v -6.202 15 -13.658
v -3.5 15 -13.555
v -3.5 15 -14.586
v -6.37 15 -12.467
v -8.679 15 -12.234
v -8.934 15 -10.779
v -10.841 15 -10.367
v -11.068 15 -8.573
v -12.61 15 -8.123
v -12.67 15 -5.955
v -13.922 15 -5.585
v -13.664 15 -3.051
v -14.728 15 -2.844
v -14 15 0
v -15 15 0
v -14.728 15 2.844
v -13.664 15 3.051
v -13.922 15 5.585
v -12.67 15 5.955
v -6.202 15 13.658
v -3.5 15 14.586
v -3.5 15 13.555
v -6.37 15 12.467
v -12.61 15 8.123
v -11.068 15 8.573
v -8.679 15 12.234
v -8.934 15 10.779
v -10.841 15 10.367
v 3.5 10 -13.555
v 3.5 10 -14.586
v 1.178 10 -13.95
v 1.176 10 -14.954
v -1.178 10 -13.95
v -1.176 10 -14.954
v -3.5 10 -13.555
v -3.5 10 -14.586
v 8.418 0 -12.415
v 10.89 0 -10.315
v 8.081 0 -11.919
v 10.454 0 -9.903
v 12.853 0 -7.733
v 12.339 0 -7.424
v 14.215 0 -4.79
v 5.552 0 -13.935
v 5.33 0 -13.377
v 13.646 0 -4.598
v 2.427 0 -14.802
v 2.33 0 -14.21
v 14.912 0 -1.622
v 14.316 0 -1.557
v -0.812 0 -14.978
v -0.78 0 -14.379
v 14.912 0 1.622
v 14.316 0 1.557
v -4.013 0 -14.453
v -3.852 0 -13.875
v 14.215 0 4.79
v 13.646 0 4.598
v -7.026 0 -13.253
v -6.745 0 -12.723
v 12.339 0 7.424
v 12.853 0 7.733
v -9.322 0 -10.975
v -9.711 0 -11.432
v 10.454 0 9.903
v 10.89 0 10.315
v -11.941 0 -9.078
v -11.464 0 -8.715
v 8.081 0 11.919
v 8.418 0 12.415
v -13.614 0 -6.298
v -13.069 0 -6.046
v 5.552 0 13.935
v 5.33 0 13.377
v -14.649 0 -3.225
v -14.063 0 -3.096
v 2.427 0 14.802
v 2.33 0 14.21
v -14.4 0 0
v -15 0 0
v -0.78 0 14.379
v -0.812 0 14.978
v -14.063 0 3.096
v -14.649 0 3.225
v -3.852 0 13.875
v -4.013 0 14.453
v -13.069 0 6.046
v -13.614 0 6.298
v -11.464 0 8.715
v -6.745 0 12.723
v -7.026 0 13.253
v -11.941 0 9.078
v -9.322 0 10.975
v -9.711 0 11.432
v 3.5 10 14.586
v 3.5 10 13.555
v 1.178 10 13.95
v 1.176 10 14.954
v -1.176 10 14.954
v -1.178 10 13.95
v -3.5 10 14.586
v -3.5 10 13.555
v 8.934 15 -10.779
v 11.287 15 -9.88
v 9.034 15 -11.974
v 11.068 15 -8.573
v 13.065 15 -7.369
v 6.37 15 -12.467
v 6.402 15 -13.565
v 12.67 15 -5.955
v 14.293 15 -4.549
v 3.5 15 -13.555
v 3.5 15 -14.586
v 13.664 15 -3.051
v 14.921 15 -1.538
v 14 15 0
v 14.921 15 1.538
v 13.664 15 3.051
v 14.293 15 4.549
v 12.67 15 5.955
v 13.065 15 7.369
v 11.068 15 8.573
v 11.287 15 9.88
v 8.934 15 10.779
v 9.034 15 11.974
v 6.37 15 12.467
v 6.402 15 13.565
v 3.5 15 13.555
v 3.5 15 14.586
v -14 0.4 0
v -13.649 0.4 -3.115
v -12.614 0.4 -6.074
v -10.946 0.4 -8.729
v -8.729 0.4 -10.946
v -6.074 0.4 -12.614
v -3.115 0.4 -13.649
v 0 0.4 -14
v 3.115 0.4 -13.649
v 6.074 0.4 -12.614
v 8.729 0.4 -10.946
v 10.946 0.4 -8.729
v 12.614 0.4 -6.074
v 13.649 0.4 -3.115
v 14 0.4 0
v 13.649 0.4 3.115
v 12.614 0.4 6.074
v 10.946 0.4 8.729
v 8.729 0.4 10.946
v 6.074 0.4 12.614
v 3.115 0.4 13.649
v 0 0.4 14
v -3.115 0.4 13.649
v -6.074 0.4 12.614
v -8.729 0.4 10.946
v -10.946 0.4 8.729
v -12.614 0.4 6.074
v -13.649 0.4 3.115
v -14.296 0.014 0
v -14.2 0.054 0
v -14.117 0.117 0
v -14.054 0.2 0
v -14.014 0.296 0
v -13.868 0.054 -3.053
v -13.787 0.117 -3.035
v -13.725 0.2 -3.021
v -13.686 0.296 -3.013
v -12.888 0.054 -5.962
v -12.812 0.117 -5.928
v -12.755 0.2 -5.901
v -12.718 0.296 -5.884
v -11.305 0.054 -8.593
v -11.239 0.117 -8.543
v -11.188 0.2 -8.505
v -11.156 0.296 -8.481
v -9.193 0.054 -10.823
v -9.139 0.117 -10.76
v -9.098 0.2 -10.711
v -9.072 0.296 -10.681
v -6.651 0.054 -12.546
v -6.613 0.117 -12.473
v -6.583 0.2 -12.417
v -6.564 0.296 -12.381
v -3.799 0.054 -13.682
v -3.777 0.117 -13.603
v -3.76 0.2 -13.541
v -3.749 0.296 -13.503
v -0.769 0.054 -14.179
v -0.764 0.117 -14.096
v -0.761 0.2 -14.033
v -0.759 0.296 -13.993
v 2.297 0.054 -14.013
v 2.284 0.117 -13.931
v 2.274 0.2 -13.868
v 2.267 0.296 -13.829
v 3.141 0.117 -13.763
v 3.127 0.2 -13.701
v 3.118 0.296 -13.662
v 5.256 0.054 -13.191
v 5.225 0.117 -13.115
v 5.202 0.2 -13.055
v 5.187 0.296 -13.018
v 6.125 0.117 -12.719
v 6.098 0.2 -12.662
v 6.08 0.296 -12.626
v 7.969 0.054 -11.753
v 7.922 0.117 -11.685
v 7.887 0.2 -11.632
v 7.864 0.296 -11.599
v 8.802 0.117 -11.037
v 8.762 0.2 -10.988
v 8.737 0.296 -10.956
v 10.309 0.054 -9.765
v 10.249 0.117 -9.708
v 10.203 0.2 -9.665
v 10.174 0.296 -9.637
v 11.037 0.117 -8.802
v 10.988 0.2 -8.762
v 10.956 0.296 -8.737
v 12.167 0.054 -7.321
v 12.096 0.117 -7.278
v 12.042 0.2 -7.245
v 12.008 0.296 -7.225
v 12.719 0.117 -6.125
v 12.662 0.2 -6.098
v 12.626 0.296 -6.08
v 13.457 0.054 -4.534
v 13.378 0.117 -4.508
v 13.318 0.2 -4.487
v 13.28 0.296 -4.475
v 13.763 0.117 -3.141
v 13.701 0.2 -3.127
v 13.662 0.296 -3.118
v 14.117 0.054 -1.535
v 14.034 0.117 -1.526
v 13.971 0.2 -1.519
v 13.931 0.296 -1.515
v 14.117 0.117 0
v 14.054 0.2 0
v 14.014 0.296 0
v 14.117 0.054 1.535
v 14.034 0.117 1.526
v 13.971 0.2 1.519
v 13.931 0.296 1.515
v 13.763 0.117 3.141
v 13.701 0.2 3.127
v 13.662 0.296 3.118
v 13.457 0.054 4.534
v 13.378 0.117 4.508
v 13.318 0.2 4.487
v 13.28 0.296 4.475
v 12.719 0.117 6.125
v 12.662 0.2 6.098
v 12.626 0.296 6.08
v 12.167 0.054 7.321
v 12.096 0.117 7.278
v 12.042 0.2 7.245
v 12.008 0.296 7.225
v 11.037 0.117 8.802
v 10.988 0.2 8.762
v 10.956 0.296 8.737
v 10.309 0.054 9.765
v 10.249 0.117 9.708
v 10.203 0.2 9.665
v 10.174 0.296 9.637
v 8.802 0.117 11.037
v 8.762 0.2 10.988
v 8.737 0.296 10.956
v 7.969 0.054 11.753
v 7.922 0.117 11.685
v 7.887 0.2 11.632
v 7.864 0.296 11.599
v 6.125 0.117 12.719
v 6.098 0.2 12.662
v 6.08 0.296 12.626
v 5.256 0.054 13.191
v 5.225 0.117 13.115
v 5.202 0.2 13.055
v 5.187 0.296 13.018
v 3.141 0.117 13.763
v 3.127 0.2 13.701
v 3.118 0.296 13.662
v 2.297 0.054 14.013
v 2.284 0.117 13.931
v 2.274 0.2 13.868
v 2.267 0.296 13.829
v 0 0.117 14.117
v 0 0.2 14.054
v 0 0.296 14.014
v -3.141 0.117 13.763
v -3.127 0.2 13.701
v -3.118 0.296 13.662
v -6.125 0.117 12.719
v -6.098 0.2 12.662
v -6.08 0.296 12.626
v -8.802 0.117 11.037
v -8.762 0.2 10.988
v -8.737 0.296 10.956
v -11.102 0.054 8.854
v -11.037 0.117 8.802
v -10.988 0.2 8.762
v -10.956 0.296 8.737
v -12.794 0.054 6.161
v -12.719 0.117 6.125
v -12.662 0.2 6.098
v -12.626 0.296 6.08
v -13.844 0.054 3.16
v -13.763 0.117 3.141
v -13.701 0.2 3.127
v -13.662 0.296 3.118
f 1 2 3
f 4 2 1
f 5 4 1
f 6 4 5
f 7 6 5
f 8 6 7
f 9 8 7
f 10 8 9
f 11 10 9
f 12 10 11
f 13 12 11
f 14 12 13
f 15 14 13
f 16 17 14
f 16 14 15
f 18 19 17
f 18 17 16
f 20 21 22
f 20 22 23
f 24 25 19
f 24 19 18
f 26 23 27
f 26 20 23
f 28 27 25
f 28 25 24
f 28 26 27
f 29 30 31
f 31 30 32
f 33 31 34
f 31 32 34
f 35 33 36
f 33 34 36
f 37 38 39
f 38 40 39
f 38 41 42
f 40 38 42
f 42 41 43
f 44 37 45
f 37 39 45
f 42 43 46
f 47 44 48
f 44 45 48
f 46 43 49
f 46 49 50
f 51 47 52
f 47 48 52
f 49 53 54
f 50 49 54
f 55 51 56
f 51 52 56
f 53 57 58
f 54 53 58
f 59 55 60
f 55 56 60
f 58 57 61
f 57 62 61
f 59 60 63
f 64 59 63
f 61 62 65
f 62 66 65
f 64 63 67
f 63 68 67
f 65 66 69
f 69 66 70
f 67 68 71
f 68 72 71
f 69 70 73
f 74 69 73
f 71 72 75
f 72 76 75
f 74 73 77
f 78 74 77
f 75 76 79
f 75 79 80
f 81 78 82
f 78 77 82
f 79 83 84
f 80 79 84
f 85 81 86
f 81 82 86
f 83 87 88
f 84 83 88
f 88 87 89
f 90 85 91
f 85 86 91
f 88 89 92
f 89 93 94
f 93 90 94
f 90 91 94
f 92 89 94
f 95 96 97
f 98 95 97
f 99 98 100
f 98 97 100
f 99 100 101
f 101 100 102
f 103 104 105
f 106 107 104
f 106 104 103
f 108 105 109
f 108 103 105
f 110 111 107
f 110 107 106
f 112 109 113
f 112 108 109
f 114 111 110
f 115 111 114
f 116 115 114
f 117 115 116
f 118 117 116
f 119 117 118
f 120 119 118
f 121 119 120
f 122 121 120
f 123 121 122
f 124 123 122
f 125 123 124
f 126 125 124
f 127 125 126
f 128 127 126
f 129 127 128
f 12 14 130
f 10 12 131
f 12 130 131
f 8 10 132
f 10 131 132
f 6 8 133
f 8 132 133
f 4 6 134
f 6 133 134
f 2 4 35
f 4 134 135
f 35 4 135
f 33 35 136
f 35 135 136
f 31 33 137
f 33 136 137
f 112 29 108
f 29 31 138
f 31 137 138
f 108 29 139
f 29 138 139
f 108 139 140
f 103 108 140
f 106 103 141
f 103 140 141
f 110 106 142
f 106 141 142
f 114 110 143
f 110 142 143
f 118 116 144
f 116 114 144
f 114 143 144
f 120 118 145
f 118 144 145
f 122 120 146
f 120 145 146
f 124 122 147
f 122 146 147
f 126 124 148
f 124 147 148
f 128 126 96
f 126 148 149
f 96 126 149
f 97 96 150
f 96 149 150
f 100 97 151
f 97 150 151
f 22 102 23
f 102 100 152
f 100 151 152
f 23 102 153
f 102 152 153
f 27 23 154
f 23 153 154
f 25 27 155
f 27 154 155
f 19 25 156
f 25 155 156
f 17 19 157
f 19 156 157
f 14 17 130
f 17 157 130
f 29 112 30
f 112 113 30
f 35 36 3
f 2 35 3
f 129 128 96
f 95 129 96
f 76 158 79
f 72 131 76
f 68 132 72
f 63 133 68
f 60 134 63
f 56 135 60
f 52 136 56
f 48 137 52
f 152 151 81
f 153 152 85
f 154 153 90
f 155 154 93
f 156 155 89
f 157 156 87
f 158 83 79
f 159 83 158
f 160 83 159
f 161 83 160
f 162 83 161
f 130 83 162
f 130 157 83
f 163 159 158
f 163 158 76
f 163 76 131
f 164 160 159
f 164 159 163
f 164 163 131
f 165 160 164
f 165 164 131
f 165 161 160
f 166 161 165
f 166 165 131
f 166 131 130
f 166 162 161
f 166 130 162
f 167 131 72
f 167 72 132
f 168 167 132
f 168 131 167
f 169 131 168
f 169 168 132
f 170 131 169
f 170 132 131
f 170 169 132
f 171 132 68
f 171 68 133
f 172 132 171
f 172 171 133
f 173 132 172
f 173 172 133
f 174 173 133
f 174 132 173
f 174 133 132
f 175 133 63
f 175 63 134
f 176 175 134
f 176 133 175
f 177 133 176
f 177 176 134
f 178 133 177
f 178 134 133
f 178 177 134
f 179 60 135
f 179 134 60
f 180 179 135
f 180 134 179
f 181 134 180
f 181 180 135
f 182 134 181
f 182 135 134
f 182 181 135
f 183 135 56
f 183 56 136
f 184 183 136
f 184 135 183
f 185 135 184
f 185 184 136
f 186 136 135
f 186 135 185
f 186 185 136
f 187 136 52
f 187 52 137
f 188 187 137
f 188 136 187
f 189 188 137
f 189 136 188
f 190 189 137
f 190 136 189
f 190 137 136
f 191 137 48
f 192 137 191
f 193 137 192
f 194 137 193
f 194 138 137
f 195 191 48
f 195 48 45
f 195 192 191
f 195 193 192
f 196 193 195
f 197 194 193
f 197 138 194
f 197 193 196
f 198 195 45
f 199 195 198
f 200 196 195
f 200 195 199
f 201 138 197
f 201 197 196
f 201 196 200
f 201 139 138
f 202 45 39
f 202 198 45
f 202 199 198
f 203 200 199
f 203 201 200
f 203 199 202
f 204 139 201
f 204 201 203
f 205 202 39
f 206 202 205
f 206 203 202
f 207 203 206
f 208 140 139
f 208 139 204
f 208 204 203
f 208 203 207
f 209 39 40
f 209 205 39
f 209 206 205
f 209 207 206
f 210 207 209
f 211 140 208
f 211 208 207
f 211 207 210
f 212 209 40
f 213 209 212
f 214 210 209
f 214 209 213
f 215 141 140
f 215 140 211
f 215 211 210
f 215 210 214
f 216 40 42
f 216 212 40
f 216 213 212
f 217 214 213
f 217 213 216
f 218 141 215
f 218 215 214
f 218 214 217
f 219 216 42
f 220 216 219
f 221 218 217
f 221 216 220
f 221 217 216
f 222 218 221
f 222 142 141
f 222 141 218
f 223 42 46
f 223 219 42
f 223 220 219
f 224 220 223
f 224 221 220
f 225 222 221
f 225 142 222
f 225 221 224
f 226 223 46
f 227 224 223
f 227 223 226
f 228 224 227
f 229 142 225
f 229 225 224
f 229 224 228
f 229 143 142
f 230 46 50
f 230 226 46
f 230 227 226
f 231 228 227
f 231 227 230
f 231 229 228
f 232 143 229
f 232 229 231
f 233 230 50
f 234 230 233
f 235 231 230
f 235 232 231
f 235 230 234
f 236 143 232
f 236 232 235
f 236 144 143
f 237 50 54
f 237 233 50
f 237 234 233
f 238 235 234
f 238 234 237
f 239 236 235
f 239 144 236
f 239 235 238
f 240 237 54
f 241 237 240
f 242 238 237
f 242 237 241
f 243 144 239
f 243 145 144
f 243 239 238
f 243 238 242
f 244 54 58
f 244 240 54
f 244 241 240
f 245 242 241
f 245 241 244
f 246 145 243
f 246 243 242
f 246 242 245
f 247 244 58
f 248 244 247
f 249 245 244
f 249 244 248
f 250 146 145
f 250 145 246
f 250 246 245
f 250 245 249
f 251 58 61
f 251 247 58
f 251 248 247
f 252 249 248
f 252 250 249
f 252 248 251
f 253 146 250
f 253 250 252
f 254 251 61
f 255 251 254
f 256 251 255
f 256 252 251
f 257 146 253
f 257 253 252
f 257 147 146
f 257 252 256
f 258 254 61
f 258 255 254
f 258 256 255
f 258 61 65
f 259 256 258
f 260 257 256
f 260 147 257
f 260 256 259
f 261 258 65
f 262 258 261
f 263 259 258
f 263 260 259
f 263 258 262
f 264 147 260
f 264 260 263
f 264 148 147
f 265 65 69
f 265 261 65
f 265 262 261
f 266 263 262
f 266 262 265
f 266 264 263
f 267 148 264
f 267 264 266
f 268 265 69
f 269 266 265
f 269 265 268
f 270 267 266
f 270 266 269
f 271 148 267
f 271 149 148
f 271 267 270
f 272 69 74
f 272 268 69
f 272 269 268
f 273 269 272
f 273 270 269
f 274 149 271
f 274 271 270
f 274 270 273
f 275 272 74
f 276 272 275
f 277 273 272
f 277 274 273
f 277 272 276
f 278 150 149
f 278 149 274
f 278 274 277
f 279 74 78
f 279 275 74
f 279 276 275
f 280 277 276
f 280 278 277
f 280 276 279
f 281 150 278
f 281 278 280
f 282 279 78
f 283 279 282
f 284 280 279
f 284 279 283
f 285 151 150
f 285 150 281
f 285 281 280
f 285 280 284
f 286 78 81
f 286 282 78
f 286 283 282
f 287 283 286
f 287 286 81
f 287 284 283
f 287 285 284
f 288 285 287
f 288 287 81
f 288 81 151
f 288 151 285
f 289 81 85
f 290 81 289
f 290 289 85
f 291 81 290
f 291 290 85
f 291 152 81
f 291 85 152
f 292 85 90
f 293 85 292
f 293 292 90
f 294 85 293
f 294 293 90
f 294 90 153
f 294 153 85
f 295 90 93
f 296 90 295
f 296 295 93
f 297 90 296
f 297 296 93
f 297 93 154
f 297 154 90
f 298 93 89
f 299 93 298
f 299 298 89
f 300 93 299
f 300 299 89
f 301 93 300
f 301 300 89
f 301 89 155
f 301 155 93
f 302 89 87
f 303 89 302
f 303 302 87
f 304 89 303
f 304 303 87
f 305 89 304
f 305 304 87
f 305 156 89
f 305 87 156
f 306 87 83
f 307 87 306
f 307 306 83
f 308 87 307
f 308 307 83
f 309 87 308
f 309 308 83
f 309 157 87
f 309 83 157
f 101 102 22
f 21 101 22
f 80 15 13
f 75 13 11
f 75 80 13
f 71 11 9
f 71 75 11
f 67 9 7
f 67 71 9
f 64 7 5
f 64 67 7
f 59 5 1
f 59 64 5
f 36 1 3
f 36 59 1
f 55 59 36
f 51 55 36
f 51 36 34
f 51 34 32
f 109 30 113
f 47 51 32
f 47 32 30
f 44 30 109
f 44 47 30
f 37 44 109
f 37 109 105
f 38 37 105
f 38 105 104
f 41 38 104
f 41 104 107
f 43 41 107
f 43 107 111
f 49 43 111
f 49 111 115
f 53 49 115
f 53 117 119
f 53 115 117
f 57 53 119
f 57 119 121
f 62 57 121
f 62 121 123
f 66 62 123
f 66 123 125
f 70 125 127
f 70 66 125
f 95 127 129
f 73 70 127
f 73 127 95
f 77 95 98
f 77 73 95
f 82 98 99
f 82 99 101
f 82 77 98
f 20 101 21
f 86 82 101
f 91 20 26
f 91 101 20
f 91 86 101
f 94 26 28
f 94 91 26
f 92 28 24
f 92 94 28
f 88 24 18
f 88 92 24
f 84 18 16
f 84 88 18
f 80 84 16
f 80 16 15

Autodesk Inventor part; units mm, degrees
ref_plane "YZ Plane" through (0, 0, 0) normal (1, 0, 0) x (0, 1, 0)
ref_plane "XZ Plane" through (0, 0, 0) normal (0, 1, 0) x (-1, 0, 0)
ref_plane "XY Plane" through (0, 0, 0) normal (0, 0, 1) x (1, 0, 0)
sketch "Sketch1" plane through (0, 0, 0) normal (0, 1, 0) x (-1, 0, 0)
  circle A0 centre (0, 0) radius 14
  circle A1 centre (0, 0) radius 15
  dimension "d0" = 1
  dimension "d1" = 28
extrude "Extrusion1" add sketch "Sketch1" along normal blind 15
sketch "Sketch2" plane through (0, 0, 0) normal (0, 0, 1) x (1, 0, 0)
  line L0 (15, 15) -> (-15, 15) projected
  line L1 (-3.5, 15) -> (3.5, 15)
  line L2 (3.5, 15) -> (3.5, 10)
  line L3 (3.5, 10) -> (-3.5, 10)
  line L4 (-3.5, 10) -> (-3.5, 15)
  point P0 (0, 0)
  point P1 (0, 10)
  dimension "d4" = 7
  dimension "d5" = 5
extrude "Extrusion2" cut sketch "Sketch2" along normal through all both and the other way through all
fillet "Fillet1" radius 0.4 1 edges at (14, 0, 0)
properties part number "tensioner_base"
